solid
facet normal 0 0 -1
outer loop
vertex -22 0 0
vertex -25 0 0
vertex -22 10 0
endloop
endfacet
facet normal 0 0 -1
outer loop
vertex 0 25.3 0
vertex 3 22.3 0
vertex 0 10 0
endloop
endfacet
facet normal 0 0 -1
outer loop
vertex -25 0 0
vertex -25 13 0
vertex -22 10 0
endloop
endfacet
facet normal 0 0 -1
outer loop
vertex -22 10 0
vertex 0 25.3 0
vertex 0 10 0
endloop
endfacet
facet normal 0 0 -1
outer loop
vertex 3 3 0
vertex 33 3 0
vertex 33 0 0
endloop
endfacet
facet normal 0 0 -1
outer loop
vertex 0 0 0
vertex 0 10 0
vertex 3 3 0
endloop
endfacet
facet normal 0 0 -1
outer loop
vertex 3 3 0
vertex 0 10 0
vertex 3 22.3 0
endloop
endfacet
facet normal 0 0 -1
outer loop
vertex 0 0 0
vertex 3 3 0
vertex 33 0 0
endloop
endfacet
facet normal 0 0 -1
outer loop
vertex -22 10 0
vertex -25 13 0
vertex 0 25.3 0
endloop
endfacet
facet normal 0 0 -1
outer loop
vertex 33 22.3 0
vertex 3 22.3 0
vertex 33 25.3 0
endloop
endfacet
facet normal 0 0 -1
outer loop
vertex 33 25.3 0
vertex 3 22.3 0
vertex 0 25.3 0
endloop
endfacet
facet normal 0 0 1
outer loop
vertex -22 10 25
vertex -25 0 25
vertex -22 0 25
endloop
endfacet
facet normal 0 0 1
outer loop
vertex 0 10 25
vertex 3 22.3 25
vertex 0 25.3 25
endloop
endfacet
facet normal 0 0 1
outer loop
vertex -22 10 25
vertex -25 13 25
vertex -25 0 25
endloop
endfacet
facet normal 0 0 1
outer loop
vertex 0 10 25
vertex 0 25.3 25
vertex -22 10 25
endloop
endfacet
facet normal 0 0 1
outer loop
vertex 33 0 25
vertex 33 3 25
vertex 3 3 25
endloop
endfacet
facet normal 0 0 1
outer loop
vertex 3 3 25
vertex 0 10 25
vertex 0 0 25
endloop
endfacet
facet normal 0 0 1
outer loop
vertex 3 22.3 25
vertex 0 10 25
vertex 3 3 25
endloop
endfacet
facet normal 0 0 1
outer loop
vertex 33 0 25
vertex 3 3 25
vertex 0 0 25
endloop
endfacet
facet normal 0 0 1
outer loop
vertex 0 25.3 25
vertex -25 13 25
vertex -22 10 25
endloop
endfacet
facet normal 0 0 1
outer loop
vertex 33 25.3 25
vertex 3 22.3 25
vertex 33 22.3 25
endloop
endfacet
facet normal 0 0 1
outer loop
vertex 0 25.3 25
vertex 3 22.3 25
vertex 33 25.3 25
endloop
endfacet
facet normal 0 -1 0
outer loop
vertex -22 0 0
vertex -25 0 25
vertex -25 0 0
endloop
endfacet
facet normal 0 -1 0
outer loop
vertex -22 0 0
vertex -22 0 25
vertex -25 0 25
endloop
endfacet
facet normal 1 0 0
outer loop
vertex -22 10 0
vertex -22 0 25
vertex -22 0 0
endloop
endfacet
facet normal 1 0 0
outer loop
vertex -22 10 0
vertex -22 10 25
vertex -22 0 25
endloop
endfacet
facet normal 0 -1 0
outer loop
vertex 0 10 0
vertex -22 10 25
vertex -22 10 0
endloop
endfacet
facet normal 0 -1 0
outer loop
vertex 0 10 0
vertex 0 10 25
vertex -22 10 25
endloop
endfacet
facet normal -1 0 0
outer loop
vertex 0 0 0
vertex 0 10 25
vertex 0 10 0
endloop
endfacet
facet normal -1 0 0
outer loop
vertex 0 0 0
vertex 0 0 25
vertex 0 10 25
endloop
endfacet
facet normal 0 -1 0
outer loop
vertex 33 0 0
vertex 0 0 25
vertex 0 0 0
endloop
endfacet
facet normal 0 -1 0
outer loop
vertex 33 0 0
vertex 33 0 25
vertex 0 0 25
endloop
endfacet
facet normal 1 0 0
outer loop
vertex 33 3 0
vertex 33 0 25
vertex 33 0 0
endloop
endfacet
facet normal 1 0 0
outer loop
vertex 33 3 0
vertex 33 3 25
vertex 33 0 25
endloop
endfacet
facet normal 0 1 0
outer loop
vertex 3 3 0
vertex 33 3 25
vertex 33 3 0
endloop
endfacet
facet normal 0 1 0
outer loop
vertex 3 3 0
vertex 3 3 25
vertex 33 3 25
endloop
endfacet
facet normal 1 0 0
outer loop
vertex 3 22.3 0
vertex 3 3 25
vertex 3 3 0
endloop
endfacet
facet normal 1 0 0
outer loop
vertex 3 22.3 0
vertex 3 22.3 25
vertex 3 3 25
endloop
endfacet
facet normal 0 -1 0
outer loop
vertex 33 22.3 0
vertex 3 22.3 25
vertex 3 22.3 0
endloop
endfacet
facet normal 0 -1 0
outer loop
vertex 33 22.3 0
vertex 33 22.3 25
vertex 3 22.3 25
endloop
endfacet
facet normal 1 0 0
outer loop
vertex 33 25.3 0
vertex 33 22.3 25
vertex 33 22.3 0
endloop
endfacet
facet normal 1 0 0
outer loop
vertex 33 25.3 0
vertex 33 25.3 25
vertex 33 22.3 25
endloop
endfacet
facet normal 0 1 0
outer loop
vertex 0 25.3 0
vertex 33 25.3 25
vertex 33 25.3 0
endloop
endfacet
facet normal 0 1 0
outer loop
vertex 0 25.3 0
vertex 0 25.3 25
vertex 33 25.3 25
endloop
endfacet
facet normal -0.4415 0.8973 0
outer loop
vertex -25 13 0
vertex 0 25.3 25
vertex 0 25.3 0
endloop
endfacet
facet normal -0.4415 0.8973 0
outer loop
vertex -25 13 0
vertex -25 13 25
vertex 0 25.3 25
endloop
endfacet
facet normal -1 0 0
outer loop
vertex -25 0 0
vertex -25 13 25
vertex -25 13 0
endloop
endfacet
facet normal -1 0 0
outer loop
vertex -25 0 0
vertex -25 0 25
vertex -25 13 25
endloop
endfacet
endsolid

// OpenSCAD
// customizable Headset table holder
// preview[view:south, tilt:bottom]
/* [General Settings] */
//How wide is the full holder?
TotalWidth=25;

// How thick is the table?
TableThickness=19.3;

// Strength of the upper part of your headset
WidthOfHeadband=22;


/* [Additional Settings] */
// how long should the mount reach over the table?
LengthOfHolder=30;

// How thick is each solid part of the holder?
Strength=3; 

// how deep should the groove for the headset be?
GrooveDepth=10;

linear_extrude(height =TotalWidth)
polygon(points=[
    //TopRectangle on Table
    [0,0]
    ,[LengthOfHolder+Strength,0]
    ,[LengthOfHolder+Strength,Strength]
    ,[Strength,Strength] //Front of table
    ,[Strength,Strength+TableThickness]
    //Rectangle under table
    ,[LengthOfHolder+Strength,Strength+TableThickness]
    ,[LengthOfHolder+Strength,2*Strength+TableThickness]
    ,[0,2*Strength+TableThickness]
    // headset part:
    ,[0,GrooveDepth]
    ,[-WidthOfHeadband,GrooveDepth]
    ,[-WidthOfHeadband,0]
    ,[-WidthOfHeadband-Strength,0]
    ,[-WidthOfHeadband-Strength,GrooveDepth+3]
    ,[0,2*Strength+TableThickness]
    ]);
  
